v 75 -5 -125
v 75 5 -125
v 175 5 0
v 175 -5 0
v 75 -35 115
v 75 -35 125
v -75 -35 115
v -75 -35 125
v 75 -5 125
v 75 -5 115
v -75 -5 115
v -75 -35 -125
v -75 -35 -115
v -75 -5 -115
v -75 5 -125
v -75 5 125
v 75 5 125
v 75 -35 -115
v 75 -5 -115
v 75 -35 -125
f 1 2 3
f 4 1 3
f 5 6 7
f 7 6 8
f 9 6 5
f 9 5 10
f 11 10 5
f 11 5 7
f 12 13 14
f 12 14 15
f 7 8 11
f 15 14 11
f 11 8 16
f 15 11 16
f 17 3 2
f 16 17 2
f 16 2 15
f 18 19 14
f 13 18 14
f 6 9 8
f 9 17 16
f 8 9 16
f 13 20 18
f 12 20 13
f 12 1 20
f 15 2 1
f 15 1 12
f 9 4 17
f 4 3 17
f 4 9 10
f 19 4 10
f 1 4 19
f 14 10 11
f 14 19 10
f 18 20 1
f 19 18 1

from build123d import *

# Parameters (mm, degrees)
BOSS_EXTRUDE1_DEPTH = 5
SKETCH2_W           = 150
SKETCH2_H           = 30
BOSS_EXTRUDE2_DEPTH = 10


with BuildPart() as part:
    # Sketch1 → Boss-Extrude1 (new, symmetric)
    with BuildSketch(Plane(origin=(0, 0, 0), x_dir=(1, 0, 0), z_dir=(0, 1, 0))):
        Polygon((75, 125), (175, 0), (75, -125), (-75, -125), (-75, 125), align=None)
    extrude(amount=BOSS_EXTRUDE1_DEPTH, both=True)

    # Sketch2 → Boss-Extrude2 (add)
    with BuildSketch(Plane(origin=(0, 0, -125), x_dir=(-1, 0, 0), z_dir=(0, 0, -1))):
        with Locations((0, -20)):
            Rectangle(SKETCH2_W, SKETCH2_H)
    boss_extrude2 = extrude(amount=-BOSS_EXTRUDE2_DEPTH)

    # Mirror1: Boss-Extrude2 across plane
    add(boss_extrude2.mirror(Plane.XY))


solid = part.part
